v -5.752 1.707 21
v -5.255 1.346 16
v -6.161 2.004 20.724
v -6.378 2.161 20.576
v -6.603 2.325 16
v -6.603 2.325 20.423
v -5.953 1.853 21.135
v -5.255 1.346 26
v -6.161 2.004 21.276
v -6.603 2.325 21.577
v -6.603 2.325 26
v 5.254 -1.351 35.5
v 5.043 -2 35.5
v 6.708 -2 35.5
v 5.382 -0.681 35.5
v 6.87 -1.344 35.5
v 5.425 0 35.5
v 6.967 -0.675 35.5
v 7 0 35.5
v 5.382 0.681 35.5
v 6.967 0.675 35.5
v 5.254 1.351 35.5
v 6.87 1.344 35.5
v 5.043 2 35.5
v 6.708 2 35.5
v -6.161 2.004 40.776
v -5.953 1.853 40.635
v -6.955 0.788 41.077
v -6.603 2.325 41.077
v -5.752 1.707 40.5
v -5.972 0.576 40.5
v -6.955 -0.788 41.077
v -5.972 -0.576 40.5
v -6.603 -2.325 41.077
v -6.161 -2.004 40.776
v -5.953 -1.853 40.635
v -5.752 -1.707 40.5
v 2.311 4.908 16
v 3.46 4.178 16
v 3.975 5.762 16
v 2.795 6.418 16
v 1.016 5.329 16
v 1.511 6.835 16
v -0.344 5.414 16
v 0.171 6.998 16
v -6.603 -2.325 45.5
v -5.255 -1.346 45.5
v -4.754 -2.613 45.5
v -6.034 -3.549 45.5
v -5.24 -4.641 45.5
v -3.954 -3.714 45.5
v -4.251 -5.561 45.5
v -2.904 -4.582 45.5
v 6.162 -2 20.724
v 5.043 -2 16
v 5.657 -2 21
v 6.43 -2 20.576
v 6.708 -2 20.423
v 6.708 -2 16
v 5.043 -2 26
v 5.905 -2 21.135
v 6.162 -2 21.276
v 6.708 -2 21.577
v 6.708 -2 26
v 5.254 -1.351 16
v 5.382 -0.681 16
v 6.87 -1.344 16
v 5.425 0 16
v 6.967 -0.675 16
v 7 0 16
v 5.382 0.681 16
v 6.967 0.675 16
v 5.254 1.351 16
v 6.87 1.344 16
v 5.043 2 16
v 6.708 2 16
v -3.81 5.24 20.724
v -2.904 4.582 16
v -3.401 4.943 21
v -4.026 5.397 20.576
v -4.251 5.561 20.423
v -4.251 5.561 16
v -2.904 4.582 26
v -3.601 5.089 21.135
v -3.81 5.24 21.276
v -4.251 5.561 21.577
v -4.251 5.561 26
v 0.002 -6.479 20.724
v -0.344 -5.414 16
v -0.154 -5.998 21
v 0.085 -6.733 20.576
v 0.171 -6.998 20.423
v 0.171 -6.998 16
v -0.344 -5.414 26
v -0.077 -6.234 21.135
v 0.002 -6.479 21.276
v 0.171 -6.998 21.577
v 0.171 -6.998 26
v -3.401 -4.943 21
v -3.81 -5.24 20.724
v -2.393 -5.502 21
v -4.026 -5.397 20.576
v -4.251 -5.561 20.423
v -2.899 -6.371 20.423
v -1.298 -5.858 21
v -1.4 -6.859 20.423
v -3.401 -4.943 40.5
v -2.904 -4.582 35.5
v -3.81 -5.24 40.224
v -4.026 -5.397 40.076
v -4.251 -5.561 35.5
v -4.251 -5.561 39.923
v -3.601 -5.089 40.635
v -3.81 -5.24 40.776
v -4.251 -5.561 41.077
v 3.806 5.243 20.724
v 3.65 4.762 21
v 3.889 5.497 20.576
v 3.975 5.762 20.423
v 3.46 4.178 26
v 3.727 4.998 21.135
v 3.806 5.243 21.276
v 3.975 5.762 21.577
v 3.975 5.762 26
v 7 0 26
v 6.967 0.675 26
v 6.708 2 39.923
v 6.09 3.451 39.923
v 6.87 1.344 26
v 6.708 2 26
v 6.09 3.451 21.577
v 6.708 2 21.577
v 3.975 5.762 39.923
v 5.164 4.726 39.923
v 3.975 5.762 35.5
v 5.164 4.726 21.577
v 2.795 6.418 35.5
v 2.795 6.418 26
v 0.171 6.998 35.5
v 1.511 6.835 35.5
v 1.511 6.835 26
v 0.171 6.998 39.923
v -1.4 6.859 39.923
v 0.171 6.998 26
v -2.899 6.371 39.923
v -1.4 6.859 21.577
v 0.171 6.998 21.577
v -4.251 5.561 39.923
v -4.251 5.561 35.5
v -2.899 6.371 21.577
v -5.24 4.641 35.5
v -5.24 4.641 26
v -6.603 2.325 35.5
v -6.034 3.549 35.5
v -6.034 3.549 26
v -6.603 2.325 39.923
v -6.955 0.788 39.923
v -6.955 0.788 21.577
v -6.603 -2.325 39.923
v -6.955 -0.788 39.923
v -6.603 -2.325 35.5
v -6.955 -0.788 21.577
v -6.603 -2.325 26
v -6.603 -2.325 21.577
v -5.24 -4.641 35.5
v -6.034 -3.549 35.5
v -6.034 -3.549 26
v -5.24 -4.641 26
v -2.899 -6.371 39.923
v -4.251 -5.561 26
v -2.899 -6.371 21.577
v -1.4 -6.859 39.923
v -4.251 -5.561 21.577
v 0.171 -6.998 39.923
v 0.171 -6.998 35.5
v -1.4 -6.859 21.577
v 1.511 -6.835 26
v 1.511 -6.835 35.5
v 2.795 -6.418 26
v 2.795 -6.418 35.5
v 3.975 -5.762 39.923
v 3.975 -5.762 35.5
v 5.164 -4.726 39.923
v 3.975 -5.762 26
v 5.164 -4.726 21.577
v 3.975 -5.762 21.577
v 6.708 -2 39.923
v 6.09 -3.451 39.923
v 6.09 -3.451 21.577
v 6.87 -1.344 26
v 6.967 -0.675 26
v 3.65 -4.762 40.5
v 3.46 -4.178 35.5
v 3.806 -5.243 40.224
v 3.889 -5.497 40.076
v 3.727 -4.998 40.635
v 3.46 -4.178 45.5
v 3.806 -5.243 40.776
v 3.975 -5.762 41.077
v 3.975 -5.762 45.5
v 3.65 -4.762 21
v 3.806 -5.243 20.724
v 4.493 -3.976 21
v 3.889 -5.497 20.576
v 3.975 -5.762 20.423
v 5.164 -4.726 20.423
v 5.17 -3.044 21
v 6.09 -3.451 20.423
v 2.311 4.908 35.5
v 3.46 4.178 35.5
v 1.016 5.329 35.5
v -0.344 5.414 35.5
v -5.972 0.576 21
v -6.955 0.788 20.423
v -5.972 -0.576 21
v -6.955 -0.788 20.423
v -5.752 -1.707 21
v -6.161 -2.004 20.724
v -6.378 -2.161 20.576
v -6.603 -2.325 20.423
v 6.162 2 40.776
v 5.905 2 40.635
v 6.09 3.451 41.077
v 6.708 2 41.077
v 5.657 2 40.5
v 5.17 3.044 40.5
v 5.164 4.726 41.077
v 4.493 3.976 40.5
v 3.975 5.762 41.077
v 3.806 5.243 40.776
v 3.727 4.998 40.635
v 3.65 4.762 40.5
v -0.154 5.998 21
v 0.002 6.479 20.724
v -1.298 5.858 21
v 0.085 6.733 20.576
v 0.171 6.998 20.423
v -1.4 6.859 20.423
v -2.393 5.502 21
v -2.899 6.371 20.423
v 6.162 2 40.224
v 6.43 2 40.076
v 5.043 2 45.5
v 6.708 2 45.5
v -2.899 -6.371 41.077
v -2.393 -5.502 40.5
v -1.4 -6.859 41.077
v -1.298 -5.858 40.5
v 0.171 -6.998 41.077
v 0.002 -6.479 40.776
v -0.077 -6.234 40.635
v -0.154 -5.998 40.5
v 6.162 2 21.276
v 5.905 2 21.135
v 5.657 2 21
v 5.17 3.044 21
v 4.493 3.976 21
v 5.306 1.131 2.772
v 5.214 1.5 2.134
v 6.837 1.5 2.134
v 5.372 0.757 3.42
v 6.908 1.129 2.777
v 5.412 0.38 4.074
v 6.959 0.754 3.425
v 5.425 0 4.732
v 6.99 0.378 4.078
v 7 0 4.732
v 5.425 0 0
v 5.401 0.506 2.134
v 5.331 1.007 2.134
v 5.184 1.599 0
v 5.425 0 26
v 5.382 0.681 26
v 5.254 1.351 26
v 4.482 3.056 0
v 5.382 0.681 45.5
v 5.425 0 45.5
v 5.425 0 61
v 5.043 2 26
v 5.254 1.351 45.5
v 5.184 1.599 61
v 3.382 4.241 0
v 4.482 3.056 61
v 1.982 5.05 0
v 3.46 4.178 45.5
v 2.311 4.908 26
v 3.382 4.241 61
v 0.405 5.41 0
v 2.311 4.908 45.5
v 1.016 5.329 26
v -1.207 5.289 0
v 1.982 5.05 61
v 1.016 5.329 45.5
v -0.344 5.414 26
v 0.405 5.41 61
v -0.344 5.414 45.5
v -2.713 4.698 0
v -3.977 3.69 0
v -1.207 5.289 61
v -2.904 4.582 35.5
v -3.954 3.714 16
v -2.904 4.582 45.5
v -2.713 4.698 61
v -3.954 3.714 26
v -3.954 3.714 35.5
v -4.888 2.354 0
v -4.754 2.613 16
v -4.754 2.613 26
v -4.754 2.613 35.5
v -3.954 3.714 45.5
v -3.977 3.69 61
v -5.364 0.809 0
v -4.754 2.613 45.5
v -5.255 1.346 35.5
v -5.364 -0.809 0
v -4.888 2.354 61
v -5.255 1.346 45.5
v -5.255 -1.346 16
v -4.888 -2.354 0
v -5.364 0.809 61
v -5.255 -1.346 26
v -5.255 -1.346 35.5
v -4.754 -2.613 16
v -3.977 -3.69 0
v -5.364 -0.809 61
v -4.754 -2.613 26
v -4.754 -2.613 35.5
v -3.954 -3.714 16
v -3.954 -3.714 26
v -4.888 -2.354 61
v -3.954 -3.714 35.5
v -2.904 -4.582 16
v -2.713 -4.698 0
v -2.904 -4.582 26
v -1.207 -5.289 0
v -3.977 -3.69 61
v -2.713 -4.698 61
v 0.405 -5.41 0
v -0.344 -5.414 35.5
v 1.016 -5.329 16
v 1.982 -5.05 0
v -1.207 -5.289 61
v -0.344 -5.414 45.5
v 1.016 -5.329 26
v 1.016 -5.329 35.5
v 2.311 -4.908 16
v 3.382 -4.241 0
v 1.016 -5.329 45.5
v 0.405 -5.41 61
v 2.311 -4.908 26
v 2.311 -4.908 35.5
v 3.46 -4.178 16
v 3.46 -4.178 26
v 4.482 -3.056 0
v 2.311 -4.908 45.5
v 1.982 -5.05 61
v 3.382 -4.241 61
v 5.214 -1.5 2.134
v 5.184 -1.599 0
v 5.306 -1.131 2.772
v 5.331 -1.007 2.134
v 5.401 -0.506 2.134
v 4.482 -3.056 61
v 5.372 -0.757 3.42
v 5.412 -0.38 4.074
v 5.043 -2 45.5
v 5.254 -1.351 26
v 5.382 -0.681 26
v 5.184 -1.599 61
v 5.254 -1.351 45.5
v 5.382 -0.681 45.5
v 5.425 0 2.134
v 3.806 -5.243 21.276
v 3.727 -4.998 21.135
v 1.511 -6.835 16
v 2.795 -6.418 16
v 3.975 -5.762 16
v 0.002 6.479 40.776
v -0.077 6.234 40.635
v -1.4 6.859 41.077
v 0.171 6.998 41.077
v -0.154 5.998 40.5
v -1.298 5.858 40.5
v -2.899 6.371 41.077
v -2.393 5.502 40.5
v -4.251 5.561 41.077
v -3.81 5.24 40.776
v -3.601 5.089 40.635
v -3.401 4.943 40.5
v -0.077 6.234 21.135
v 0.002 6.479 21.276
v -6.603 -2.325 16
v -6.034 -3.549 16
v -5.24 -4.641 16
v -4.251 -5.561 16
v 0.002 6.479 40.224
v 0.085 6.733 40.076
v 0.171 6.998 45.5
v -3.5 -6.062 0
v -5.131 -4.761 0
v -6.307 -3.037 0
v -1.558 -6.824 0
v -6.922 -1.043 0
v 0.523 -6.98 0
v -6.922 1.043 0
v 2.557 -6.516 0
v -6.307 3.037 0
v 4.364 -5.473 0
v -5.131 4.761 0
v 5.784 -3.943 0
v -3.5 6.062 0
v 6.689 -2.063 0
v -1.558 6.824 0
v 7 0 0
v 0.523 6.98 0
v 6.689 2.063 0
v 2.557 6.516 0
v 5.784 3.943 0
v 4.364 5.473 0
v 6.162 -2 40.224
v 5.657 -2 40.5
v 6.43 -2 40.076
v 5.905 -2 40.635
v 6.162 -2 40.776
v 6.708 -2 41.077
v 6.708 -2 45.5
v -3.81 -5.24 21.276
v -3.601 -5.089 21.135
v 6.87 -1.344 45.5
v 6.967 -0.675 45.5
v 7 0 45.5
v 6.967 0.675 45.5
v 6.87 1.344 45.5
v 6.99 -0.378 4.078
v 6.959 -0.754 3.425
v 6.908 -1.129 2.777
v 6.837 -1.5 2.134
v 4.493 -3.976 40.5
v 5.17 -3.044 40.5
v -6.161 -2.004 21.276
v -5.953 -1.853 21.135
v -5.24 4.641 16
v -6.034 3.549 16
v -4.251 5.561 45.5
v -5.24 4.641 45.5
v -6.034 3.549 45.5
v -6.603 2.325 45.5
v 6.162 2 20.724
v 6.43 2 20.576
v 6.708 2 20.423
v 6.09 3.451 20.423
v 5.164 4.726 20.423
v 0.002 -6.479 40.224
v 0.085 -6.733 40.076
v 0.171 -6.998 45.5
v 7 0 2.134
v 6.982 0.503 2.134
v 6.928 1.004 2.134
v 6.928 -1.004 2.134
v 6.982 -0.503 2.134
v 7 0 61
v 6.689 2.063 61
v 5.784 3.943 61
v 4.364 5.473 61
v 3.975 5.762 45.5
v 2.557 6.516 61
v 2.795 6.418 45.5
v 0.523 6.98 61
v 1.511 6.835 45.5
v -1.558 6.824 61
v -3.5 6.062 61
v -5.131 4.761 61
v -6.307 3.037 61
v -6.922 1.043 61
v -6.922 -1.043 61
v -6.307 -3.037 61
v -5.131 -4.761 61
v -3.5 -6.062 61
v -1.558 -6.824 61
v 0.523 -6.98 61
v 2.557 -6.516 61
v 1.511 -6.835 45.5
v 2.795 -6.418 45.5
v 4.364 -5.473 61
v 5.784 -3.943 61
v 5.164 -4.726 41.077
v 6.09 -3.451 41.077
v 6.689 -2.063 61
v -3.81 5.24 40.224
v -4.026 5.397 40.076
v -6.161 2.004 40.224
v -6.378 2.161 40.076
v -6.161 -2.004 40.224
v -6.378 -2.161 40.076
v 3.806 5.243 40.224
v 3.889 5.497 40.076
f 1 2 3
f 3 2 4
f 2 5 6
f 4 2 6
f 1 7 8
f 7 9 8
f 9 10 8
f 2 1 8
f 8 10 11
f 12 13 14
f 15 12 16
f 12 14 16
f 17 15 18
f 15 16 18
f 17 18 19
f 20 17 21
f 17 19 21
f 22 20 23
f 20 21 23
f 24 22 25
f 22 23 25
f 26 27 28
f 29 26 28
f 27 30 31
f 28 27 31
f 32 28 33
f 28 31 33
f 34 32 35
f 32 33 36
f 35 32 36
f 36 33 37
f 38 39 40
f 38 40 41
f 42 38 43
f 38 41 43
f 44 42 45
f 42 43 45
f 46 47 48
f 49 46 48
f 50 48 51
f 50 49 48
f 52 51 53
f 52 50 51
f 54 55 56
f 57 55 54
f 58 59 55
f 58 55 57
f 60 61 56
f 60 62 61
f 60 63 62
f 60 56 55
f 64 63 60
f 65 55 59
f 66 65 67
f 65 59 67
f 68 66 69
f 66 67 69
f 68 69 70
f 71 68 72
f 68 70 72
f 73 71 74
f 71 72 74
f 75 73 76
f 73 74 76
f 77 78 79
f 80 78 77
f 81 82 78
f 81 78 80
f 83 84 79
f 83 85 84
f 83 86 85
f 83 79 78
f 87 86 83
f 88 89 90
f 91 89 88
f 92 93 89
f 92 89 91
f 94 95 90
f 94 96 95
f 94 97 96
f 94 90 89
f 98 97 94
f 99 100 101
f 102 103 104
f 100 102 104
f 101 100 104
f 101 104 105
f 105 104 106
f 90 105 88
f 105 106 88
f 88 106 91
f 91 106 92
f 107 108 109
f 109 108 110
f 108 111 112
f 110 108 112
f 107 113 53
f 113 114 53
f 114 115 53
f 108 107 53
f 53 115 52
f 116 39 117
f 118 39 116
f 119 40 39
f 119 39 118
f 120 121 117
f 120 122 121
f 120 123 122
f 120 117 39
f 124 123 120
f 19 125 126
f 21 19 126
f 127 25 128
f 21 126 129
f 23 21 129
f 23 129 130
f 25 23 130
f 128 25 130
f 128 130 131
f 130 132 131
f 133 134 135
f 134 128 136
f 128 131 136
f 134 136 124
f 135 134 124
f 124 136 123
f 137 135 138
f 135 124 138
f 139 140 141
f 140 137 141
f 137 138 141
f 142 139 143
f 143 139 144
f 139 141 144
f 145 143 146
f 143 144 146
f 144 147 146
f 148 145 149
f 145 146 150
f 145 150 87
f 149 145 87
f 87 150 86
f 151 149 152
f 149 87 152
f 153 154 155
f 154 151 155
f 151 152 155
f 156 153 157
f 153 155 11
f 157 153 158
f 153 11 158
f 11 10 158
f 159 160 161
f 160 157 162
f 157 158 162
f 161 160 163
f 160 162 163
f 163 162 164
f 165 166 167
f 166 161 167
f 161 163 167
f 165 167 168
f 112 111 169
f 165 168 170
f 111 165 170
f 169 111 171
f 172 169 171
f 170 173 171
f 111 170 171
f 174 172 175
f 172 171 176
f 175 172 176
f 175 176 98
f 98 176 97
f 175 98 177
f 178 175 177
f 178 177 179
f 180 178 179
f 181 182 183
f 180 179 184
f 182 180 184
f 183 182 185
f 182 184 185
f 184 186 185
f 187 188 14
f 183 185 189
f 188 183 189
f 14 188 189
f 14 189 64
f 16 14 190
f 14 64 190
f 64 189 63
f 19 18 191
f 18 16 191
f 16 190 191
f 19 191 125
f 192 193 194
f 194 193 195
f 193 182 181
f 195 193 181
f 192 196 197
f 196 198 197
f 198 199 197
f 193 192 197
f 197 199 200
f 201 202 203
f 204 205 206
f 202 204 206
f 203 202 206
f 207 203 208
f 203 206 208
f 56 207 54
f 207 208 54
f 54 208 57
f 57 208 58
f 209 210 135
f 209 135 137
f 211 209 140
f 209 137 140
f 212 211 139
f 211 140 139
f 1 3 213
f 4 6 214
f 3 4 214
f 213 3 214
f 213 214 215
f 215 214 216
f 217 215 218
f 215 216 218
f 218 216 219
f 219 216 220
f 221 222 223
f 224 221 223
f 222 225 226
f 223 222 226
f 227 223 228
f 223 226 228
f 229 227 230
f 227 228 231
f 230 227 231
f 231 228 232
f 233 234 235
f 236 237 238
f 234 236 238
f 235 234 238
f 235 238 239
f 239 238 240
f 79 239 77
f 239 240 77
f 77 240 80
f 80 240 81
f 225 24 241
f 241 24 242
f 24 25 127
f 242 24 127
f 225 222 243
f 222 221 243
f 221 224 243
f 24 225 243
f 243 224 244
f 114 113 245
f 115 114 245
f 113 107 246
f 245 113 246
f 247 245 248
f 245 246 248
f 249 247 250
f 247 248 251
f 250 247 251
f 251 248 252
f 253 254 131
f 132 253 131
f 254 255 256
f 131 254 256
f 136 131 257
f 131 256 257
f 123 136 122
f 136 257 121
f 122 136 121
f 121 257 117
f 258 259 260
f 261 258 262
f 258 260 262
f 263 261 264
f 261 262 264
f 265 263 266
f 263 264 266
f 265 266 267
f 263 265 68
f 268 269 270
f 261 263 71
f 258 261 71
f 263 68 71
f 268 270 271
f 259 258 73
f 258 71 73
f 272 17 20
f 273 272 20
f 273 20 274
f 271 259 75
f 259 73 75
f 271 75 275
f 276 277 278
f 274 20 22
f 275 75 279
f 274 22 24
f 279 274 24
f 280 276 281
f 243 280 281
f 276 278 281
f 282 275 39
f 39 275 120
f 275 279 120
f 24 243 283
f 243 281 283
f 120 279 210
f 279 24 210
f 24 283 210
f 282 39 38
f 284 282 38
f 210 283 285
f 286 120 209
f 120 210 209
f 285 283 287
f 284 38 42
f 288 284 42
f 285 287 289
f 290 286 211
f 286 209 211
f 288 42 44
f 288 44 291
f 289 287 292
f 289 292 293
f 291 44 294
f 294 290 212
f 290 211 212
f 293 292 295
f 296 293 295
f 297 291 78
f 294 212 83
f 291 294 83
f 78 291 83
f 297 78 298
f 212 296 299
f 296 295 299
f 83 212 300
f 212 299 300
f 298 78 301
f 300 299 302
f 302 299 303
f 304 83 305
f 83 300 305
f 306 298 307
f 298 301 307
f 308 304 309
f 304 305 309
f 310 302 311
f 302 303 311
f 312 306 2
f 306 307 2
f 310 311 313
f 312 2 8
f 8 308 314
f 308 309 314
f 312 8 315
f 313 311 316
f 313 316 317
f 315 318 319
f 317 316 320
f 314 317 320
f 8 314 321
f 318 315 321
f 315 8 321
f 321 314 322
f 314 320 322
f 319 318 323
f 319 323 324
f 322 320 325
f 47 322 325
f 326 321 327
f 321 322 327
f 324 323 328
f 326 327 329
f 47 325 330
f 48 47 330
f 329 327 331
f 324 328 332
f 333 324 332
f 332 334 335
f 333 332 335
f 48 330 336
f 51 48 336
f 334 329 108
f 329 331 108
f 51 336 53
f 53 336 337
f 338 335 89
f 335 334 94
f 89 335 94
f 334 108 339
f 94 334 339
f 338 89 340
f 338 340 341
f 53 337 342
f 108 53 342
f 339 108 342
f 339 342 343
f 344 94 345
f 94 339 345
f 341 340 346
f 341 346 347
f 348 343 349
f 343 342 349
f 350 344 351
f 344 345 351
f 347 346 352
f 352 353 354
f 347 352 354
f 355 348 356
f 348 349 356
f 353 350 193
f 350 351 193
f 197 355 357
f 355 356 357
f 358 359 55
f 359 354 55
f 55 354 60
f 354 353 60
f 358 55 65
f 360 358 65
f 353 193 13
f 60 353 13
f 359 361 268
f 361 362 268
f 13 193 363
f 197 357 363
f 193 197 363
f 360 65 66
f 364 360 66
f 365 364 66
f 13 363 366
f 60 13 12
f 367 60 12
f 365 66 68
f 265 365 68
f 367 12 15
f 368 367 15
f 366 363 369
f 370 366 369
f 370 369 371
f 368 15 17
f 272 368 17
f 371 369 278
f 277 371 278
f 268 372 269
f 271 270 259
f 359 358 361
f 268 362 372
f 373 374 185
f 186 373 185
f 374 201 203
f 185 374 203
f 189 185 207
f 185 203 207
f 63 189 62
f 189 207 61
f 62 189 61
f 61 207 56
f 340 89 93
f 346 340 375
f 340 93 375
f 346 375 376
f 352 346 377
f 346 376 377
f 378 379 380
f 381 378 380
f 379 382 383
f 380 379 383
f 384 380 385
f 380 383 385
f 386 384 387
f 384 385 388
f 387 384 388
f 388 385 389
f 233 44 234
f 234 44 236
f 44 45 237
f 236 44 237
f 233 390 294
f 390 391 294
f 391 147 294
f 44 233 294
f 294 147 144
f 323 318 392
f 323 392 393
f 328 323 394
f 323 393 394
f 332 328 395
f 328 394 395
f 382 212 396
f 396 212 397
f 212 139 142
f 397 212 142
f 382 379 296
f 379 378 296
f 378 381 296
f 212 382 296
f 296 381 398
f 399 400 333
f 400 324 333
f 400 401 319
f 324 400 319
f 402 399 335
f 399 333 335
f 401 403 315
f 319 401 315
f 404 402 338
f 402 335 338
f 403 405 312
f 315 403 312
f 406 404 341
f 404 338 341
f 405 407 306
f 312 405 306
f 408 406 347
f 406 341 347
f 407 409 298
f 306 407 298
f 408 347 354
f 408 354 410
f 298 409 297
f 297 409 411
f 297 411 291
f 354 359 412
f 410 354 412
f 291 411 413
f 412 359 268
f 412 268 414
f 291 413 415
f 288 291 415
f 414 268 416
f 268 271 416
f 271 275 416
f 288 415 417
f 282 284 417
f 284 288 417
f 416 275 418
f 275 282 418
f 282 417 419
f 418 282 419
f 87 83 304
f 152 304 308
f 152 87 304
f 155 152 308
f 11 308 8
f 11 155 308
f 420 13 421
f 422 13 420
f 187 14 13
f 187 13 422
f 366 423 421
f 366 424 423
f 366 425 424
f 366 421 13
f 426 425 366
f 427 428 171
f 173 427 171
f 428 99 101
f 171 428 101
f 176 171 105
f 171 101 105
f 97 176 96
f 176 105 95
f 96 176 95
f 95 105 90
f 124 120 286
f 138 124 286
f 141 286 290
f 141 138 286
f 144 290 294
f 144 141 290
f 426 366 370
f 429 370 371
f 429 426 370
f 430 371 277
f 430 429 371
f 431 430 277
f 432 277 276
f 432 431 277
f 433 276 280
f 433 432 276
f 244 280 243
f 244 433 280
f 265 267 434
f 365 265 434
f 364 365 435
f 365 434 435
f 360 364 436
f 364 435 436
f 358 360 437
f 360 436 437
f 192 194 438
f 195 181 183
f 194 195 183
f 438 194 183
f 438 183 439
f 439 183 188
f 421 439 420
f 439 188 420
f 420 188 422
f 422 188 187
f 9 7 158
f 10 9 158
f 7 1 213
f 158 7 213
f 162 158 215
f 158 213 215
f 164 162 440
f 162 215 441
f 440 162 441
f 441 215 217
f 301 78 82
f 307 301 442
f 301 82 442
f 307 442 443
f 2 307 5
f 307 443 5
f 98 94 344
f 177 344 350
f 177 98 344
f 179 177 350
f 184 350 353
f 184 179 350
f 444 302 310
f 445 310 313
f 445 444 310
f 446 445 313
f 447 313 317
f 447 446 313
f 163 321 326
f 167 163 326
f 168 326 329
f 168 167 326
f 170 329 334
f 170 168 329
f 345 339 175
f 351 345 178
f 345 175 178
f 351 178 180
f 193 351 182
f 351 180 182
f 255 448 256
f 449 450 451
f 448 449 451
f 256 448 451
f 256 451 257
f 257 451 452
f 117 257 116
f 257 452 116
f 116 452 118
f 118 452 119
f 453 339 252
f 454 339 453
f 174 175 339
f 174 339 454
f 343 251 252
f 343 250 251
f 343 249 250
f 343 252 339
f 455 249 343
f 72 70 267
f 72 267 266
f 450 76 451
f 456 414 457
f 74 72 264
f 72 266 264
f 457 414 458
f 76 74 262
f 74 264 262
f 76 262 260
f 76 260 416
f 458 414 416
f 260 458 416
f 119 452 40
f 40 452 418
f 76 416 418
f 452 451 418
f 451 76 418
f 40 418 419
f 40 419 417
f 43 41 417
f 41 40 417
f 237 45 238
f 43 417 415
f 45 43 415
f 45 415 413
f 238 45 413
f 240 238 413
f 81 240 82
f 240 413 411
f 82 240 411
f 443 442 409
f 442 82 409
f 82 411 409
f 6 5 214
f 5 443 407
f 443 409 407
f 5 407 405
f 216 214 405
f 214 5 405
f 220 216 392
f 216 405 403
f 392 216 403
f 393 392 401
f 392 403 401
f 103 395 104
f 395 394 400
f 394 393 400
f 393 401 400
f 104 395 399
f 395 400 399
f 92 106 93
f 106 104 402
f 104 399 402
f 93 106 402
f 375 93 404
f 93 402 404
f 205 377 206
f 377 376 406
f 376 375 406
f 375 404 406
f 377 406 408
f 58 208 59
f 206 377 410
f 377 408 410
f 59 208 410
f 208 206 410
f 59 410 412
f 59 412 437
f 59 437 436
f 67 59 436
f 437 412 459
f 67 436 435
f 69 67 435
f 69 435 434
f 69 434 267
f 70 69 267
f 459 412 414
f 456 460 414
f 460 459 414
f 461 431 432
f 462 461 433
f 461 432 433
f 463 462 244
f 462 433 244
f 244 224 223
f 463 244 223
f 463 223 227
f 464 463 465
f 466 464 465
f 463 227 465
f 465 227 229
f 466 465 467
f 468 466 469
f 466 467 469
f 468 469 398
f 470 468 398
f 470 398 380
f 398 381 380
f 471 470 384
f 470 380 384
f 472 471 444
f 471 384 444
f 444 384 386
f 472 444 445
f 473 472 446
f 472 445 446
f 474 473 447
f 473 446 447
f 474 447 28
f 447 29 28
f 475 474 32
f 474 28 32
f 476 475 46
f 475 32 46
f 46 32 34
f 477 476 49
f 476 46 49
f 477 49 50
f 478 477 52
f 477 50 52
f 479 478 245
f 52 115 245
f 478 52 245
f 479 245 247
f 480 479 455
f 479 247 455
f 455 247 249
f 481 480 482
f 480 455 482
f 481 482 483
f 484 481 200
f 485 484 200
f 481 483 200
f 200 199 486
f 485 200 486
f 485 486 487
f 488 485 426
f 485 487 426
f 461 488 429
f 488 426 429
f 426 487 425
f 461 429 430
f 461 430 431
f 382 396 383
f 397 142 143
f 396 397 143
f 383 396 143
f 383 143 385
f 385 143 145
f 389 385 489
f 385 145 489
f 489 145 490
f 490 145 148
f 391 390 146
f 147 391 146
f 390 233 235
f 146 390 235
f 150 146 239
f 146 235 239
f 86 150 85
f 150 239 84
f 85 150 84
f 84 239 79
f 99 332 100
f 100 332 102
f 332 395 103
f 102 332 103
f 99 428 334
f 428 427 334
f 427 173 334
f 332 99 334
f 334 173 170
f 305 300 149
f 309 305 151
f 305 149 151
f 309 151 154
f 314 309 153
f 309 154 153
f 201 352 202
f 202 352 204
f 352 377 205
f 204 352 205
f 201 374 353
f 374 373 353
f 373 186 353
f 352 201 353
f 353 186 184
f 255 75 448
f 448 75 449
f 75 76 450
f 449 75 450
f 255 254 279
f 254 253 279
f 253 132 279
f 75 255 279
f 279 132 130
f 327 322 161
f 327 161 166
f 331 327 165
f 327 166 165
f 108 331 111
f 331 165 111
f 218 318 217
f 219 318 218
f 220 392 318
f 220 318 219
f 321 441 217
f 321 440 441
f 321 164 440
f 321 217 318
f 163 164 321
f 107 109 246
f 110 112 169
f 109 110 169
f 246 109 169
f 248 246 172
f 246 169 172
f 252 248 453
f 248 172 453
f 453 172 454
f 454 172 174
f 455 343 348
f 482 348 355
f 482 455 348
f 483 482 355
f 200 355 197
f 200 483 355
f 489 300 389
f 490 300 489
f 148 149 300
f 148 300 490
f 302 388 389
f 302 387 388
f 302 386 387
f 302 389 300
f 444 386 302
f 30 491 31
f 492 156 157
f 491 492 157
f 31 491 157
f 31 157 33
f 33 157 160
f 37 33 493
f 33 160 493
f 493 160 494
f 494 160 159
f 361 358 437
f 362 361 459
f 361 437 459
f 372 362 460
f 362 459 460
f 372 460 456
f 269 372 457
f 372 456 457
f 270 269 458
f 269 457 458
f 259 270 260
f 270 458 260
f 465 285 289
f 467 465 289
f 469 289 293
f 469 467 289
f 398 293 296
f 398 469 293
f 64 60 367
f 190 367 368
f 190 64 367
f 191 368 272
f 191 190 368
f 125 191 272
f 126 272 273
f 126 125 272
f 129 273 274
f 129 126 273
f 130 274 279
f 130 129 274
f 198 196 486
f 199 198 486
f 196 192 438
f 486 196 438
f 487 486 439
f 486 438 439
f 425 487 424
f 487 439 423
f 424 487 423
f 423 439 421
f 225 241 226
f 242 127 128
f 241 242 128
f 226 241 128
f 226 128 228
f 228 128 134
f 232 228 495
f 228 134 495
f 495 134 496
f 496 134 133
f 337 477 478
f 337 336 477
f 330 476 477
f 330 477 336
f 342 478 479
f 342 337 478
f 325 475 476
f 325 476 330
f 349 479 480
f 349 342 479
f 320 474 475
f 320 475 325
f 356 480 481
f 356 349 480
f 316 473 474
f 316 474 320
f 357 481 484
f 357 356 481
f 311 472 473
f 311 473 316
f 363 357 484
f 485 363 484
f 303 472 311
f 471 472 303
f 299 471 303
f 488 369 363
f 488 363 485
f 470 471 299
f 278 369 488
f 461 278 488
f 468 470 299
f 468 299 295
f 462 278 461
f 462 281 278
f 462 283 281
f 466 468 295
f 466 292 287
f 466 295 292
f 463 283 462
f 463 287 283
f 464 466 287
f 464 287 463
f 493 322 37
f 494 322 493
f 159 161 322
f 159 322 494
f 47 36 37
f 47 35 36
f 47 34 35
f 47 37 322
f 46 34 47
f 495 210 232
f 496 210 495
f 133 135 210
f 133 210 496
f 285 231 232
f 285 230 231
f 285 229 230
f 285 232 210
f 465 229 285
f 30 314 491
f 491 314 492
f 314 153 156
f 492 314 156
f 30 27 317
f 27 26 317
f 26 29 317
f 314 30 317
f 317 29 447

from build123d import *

# Parameters (mm, degrees)
SKETCH_R           = 7
PAD_DEPTH          = 61
SKETCH001_R        = 5.425
POCKET_DEPTH       = 61.001
POCKET001_DEPTH    = 5
SKETCH004_W        = 4
SKETCH004_H        = 10
POCKET002_DEPTH    = 5
POLARPATTERN_COUNT = 5


with BuildPart() as part:
    # Sketch → Pad (new body)
    with BuildSketch(Plane.XY):
        Circle(SKETCH_R)
    extrude(amount=PAD_DEPTH)

    # Sketch001 (on Face3 of Pad) → Pocket (cut, through all)
    with BuildSketch(Plane.XY.offset(61)):
        Circle(SKETCH001_R)
    extrude(amount=-POCKET_DEPTH, mode=Mode.SUBTRACT)

    # Sketch002 (on DatumPlane) → Groove (revolve, cut)
    with BuildSketch(Plane(origin=(0, 0, 30.5), x_dir=(0, 0, -1), z_dir=(1, 0, 0))):
        Polygon((9.5, 6), (11.25, 9.031089), (7.75, 9.031089), align=None)
        Polygon((-8.25, 9.031089), (-11.75, 9.031089), (-10, 6), align=None)
    revolve(axis=Axis((0, 0, 0), (0, 0, 1)), mode=Mode.SUBTRACT)

    # Sketch003 (on DatumPlane) → Pocket001 (cut)
    with BuildSketch(Plane.YZ.offset(7)):
        Polygon((0, 4.732051), (-1.5, 2.133975), (1.5, 2.133975), align=None)
    extrude(amount=-POCKET001_DEPTH, mode=Mode.SUBTRACT)

    # Sketch004 (on DatumPlane) → Pocket002 (cut)
    with BuildSketch(Plane.YZ.offset(7)):
        with Locations((0, 40.5)):
            Rectangle(SKETCH004_W, SKETCH004_H)
        with Locations((0, 21)):
            Rectangle(SKETCH004_W, SKETCH004_H)
    pocket002 = extrude(amount=-POCKET002_DEPTH, mode=Mode.SUBTRACT)

    # PolarPattern: Pocket002 ×5 about axis
    polarpattern_axis = Axis((0, 0, 0), (0, 0, 1))
    for i in range(1, POLARPATTERN_COUNT):
        add(pocket002.rotate(polarpattern_axis, i * 360 / POLARPATTERN_COUNT), mode=Mode.SUBTRACT)


solid = part.part
